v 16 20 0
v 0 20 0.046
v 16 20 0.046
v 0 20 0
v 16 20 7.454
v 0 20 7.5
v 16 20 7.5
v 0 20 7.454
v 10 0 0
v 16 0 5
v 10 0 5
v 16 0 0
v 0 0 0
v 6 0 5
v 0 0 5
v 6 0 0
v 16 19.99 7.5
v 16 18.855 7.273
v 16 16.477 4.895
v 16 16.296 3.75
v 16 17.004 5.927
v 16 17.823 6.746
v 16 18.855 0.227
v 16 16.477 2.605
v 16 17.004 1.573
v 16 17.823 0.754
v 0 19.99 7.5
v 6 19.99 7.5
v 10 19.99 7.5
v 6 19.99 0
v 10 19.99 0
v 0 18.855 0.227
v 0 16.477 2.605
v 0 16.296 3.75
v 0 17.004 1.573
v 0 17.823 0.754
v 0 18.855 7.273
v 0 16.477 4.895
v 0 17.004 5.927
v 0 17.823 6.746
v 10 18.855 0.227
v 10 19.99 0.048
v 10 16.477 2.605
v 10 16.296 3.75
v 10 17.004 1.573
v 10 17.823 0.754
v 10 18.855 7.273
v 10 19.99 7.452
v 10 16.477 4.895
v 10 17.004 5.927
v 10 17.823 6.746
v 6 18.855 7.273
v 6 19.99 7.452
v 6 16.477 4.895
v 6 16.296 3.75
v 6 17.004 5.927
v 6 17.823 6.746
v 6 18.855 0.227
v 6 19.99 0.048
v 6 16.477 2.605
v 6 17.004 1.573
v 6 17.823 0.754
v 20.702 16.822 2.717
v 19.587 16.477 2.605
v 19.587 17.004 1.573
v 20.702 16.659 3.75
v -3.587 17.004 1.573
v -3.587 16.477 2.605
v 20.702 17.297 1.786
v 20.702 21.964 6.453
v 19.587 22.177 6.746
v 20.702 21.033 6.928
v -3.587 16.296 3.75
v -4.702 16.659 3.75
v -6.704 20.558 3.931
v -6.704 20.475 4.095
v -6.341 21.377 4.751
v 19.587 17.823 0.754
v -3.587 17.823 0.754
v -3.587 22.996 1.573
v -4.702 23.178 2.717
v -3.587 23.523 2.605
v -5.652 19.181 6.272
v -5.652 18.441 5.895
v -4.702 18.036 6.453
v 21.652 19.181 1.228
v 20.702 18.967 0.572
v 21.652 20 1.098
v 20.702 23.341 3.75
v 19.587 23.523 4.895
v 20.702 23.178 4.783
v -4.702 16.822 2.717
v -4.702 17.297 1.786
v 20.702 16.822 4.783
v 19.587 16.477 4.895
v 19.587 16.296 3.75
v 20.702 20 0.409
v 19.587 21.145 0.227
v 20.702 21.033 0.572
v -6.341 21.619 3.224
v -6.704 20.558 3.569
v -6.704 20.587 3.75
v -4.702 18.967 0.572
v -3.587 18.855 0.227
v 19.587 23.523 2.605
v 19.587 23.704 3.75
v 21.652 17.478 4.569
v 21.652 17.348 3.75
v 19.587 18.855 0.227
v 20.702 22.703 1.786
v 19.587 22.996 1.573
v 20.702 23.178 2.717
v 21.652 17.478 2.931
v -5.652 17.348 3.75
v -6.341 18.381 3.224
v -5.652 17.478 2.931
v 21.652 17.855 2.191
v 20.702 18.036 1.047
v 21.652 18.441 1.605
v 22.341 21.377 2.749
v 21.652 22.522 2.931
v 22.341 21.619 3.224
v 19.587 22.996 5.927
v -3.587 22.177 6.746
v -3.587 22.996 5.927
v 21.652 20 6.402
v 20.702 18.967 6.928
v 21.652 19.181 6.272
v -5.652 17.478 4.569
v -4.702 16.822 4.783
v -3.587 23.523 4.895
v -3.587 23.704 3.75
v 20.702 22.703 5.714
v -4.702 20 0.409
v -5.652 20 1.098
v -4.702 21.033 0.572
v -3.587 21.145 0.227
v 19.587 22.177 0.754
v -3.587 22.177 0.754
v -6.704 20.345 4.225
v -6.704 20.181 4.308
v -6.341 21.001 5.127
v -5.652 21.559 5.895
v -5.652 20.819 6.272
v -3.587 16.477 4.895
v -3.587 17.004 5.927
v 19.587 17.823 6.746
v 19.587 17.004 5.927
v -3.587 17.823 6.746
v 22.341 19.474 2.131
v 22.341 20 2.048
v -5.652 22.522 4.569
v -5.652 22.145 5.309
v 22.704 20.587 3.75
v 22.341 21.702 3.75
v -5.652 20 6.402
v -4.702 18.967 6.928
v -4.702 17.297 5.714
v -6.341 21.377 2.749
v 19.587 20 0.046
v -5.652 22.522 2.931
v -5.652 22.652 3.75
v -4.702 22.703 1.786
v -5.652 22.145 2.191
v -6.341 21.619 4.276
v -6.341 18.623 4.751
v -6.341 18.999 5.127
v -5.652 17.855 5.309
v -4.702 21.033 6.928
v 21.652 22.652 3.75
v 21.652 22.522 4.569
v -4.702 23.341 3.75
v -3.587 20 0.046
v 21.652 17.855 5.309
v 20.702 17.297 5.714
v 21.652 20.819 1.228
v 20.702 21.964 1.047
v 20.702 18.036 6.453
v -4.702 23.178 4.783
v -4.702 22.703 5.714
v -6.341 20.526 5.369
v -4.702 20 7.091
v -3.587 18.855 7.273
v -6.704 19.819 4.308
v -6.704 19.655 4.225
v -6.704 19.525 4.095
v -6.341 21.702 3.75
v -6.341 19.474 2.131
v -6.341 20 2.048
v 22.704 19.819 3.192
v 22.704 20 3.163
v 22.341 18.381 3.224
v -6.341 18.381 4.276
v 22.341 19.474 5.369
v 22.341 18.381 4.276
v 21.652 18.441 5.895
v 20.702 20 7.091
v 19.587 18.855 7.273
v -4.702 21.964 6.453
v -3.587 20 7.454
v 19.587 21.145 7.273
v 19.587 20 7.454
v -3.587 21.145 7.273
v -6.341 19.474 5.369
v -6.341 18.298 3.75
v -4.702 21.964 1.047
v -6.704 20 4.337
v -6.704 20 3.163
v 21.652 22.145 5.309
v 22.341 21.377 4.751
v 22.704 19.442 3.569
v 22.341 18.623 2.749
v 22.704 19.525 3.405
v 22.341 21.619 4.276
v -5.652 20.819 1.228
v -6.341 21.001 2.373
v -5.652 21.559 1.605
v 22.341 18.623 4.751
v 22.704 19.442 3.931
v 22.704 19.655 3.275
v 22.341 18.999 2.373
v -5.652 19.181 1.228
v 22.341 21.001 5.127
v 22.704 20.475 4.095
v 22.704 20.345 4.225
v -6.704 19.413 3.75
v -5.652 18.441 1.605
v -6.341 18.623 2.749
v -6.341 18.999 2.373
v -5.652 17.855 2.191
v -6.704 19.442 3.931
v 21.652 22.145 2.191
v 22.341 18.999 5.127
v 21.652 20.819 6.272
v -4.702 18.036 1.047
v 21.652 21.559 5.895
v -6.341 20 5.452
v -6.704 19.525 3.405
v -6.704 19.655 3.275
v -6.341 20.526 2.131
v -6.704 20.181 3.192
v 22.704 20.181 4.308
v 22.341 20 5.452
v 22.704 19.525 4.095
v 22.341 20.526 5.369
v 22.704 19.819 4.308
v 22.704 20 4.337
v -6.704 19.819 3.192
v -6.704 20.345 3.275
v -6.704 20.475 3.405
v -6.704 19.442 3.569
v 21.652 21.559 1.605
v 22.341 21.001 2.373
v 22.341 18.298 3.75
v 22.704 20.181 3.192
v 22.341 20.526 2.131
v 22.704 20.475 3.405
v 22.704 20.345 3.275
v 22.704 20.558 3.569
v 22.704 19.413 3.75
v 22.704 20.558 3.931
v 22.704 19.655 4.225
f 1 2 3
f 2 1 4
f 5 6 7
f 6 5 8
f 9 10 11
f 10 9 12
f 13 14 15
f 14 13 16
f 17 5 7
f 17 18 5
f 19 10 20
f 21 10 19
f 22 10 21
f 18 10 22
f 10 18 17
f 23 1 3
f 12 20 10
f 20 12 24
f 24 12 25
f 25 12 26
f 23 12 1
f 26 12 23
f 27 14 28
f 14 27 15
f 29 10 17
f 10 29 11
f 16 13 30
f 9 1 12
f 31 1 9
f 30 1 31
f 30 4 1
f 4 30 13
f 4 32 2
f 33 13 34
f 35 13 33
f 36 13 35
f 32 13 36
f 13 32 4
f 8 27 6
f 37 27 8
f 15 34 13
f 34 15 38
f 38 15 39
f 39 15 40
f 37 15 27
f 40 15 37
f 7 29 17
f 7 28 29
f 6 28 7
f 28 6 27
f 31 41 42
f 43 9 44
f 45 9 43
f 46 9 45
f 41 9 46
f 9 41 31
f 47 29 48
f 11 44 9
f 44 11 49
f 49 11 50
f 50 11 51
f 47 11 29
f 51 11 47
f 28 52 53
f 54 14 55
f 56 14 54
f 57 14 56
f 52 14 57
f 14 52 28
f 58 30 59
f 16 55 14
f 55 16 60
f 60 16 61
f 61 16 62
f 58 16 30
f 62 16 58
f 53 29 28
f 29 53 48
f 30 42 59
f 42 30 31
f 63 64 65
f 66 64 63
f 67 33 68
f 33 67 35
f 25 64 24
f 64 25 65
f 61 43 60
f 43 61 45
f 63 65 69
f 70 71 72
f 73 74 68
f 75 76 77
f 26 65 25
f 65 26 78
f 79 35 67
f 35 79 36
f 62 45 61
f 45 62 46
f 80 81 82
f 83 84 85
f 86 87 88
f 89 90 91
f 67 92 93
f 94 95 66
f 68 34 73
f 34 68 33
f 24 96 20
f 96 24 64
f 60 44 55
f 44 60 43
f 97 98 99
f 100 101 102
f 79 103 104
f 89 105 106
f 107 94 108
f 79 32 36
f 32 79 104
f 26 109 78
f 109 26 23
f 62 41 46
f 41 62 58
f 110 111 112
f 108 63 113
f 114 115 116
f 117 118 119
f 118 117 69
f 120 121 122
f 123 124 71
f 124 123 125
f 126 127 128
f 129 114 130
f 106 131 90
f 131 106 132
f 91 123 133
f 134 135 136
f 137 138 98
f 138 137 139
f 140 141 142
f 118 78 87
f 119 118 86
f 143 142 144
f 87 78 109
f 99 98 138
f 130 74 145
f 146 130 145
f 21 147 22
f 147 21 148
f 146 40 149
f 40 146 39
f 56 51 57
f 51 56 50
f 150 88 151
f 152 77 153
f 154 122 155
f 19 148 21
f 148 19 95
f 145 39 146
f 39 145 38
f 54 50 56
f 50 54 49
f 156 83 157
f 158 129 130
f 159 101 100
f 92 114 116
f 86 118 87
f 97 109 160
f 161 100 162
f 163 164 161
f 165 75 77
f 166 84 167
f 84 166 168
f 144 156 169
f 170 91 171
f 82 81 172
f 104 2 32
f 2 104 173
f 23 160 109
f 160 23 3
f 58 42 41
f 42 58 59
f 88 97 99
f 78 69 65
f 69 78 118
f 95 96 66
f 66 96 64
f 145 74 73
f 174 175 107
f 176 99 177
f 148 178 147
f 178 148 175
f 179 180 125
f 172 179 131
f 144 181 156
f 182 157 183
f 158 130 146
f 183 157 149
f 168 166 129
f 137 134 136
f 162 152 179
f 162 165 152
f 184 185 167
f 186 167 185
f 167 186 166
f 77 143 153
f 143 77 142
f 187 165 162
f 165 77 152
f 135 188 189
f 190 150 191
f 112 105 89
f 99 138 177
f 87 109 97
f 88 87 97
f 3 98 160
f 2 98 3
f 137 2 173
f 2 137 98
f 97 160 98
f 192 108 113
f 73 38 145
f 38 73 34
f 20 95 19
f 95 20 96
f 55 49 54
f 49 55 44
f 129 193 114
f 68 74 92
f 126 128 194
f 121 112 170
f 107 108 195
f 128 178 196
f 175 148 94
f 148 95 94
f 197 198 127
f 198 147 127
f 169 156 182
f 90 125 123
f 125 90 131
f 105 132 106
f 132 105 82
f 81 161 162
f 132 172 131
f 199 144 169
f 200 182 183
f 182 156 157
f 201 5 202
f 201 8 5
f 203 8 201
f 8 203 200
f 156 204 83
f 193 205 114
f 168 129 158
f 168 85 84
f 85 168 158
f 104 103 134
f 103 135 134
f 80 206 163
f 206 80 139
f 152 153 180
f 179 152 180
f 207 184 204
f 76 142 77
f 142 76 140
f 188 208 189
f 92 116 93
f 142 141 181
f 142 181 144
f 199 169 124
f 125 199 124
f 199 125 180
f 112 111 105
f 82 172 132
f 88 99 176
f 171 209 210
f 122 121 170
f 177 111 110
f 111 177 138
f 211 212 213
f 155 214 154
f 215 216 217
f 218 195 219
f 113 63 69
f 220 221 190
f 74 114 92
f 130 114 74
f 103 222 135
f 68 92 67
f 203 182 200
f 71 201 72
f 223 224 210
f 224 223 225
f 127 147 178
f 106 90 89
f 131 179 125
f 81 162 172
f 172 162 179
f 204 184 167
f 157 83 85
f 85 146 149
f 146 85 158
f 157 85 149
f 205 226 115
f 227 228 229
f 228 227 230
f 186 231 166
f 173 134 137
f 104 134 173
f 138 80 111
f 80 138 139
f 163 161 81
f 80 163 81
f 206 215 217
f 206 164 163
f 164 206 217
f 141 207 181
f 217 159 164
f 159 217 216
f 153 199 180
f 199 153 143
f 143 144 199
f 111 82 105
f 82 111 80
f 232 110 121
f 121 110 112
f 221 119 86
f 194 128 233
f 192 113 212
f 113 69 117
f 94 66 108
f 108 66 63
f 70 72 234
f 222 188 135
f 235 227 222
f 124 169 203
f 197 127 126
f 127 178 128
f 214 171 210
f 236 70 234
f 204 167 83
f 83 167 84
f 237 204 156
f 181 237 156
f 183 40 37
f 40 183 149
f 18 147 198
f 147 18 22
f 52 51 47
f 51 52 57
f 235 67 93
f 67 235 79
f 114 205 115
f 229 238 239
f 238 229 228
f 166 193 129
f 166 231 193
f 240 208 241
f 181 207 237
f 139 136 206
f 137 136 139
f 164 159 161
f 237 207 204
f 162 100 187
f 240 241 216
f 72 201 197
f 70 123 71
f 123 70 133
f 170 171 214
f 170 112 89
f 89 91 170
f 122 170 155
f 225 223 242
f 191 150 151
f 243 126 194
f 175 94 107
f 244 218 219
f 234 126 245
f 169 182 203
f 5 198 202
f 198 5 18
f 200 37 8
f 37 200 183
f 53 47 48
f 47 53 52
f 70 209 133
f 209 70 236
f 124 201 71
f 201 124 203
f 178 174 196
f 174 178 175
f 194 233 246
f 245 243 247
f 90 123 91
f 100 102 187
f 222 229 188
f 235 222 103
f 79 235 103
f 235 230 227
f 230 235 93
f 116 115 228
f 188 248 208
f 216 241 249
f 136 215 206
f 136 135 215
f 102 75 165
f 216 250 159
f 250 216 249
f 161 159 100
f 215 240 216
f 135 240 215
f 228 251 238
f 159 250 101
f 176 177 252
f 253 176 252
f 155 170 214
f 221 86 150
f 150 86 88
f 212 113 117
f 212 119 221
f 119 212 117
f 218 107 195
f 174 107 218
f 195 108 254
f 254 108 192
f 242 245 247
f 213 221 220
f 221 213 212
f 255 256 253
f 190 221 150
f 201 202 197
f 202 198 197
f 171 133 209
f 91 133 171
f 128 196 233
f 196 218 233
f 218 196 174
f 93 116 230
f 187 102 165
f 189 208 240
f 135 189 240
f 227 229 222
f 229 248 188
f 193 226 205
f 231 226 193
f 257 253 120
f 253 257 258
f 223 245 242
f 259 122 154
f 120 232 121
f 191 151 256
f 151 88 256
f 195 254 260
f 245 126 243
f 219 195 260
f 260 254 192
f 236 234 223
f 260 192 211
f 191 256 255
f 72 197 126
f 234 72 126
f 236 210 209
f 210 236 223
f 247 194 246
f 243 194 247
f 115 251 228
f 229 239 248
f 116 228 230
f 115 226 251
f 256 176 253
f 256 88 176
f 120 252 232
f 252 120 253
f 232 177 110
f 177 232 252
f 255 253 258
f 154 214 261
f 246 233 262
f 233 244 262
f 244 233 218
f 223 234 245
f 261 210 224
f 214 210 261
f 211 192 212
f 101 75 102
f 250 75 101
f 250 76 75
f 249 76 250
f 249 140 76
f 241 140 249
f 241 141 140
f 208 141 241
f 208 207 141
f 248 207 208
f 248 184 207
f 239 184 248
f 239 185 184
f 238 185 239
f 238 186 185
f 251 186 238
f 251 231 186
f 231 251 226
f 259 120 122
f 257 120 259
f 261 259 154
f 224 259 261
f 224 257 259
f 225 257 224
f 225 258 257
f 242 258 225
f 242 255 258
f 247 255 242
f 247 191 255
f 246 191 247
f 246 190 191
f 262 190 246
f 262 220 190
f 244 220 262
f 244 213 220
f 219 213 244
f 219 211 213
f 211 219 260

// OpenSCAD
tol=0.01;
armWidth=6;
armLength=20;
armHeight1=5.0;
armHeight2=7.5;
handleHeadSize=6;
handleDiameter= armHeight2;

armGap=16-armWidth*2;
$fn=20;
module arm()
{
	difference()
	{
		hull()
		{
			cube([armWidth+armGap+armWidth,tol,armHeight1]);
			translate([0,armLength-tol,0])
				cube([armWidth+armGap+armWidth,tol,armHeight2]);
		}
		translate([armWidth,-tol,-tol])
			cube([armGap,armLength,armHeight2+0.01]);
	}
	rotate([0,90,0])
	{
		hull()
		{
			translate([-handleDiameter/2,armLength,-handleHeadSize/2])
				sphere(r=handleDiameter/2);
			translate([-handleDiameter/2,armLength,armWidth+armGap+armWidth+handleHeadSize/2])
				sphere(r=handleDiameter/2);
		}
	}
}

arm();
